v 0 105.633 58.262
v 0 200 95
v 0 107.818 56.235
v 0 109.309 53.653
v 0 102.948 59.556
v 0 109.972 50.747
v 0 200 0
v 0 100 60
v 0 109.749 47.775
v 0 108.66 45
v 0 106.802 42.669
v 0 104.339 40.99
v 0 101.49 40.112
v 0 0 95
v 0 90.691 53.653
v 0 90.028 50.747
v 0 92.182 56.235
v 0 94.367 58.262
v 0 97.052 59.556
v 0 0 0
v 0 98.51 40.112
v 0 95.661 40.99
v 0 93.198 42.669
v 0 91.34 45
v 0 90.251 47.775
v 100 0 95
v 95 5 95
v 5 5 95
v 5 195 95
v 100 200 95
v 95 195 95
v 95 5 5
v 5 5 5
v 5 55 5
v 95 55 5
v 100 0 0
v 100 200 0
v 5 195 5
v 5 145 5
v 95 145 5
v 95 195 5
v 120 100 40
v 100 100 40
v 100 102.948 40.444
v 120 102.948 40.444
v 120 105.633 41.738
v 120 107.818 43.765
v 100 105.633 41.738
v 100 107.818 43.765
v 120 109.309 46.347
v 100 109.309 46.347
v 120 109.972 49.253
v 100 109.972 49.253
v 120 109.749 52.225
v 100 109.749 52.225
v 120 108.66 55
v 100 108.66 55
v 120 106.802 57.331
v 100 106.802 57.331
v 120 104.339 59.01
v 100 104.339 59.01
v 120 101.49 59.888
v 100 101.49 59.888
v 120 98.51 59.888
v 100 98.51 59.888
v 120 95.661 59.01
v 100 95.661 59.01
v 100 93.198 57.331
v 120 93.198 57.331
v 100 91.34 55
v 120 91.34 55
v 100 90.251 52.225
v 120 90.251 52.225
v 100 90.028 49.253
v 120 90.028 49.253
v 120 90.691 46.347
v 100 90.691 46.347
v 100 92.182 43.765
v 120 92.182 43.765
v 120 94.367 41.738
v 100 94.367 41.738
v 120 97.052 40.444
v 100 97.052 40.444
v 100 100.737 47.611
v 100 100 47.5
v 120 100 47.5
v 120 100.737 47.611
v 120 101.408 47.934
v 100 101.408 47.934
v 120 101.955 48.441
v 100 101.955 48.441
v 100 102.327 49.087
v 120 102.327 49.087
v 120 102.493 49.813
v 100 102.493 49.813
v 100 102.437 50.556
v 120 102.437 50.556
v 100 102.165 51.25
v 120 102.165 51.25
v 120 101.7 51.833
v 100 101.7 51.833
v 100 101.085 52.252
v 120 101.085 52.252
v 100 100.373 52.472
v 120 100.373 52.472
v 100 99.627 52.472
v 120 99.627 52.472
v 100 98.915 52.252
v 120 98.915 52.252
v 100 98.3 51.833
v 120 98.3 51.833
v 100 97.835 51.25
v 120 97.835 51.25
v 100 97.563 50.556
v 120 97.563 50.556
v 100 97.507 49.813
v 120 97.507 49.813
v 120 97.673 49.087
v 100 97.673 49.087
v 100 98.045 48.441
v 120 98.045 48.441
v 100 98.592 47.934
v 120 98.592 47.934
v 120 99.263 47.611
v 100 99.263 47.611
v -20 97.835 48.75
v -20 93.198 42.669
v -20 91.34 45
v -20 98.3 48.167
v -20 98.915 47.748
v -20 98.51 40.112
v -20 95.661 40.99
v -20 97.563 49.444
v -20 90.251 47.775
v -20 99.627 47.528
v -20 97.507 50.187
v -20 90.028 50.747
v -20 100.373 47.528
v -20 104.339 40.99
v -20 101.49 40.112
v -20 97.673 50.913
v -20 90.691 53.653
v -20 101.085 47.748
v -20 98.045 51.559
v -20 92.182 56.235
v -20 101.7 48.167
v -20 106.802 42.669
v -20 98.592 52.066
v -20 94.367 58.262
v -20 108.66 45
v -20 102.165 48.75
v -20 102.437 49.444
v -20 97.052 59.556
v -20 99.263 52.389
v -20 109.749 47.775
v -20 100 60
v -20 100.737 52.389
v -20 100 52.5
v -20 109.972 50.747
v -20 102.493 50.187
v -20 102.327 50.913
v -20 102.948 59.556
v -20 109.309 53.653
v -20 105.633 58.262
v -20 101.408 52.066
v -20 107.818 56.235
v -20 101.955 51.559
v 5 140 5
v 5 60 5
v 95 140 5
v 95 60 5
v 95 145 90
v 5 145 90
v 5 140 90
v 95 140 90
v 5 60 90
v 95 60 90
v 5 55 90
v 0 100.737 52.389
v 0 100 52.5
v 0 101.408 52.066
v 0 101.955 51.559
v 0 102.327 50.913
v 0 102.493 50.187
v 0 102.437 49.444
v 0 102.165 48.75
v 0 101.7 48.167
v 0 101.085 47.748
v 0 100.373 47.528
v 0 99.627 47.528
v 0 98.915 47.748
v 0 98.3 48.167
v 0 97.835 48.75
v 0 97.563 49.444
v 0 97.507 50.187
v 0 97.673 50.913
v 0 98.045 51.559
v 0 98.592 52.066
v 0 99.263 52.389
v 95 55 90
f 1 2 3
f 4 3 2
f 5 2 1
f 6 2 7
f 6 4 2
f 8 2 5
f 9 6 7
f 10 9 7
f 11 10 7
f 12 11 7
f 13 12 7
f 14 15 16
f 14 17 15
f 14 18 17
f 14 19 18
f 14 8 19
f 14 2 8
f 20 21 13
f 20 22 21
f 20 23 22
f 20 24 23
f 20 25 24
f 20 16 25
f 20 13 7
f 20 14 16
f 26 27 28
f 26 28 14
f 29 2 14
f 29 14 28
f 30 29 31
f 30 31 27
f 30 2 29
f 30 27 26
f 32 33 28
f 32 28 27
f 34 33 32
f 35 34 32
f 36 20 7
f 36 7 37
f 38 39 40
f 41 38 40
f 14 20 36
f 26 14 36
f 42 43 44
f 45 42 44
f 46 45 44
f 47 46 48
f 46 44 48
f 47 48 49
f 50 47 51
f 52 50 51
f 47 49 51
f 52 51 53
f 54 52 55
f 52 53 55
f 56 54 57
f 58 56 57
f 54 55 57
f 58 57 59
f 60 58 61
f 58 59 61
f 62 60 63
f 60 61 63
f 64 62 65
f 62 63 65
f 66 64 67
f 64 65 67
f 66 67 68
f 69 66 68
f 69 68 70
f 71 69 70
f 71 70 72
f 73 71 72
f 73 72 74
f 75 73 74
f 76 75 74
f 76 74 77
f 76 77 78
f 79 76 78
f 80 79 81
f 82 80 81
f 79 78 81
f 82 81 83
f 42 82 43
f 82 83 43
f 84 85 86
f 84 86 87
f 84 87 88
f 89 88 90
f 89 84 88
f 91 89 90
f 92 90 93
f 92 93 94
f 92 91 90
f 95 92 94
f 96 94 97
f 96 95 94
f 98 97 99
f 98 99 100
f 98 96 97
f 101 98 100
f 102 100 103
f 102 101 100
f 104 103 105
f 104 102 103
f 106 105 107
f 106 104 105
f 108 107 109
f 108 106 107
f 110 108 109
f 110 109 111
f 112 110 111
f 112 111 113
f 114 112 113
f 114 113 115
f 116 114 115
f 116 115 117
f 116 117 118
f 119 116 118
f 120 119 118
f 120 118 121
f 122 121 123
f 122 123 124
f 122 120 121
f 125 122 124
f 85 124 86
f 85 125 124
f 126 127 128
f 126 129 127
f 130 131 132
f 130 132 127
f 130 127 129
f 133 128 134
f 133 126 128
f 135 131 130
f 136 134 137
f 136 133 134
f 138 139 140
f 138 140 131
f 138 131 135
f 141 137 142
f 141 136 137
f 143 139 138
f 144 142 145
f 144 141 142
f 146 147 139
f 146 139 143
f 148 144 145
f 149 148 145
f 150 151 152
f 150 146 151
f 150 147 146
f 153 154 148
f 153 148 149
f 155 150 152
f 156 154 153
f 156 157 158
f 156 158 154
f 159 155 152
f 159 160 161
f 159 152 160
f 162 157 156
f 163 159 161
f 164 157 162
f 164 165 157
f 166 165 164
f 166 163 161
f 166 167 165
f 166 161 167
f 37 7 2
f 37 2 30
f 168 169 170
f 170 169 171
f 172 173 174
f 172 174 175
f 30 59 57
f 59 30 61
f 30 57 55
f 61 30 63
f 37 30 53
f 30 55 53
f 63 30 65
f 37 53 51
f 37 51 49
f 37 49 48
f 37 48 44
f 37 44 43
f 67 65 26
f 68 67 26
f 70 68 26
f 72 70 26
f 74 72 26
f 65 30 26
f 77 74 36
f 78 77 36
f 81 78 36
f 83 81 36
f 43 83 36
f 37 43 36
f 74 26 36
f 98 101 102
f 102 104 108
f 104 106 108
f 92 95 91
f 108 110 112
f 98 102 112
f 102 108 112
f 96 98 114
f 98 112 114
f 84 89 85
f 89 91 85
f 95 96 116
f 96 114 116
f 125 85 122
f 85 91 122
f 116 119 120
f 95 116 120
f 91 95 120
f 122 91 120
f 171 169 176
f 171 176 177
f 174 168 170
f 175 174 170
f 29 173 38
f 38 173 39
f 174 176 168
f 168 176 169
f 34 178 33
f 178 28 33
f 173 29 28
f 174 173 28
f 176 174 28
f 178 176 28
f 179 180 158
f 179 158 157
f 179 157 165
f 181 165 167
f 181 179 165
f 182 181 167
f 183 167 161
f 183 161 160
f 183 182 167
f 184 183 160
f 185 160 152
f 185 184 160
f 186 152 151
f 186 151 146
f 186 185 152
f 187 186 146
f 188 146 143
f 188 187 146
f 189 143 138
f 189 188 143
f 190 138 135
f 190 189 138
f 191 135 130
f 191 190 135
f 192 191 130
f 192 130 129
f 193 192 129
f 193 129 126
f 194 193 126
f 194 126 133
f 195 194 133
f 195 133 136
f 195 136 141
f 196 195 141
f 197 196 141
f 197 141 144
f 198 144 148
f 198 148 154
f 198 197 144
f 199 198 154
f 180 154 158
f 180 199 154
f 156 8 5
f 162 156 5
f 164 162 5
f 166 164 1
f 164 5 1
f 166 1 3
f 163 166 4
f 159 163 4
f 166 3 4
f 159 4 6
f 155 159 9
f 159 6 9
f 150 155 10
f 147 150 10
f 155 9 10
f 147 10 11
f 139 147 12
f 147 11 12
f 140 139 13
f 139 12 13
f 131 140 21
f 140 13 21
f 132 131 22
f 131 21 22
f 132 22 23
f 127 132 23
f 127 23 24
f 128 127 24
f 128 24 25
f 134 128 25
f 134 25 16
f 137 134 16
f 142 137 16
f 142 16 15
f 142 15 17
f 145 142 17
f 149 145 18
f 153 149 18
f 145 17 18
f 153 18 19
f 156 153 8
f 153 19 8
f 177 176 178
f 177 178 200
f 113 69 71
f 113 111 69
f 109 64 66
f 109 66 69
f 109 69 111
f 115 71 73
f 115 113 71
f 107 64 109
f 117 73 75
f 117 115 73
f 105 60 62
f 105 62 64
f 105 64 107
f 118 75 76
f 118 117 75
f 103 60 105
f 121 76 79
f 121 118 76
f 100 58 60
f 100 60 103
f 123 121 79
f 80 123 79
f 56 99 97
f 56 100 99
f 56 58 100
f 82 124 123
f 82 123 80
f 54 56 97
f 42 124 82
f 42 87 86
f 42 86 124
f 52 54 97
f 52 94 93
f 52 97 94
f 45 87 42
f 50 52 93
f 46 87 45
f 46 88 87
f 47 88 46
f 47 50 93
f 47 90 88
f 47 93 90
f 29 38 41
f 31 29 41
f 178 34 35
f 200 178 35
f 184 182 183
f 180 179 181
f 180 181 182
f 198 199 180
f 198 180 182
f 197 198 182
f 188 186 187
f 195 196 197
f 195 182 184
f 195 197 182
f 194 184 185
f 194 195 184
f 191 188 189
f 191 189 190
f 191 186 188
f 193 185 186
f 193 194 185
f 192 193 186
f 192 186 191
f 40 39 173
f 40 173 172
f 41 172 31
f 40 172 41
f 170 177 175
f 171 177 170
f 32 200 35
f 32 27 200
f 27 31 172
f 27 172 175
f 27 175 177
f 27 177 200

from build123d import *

# Parameters (mm, degrees)
SKETCH2_W           = 100
SKETCH2_H           = 100
BOSS_EXTRUDE1_DEPTH = 200
SHELL3_T            = -5
SKETCH3_W           = 90
SKETCH3_H           = 5
BOSS_EXTRUDE2_DEPTH = 85
SKETCH4_R           = 10
SKETCH4_R_2         = 2.5
BOSS_EXTRUDE3_DEPTH = 20
SKETCH5_R           = 10
SKETCH5_R_2         = 2.5
BOSS_EXTRUDE4_DEPTH = 20
SKETCH7_W           = 90
SKETCH7_H           = 5
CUT_EXTRUDE1_DEPTH  = 5


with BuildPart() as part:
    # Sketch2 → Boss-Extrude1 (new body)
    with BuildSketch(Plane(origin=(0, 0, 0), x_dir=(1, 0, 0), z_dir=(0, 1, 0))):
        with Locations((50, -50)):
            Rectangle(SKETCH2_W, SKETCH2_H)
    extrude(amount=BOSS_EXTRUDE1_DEPTH)

    # Shell3
    shell3_openings = [part.faces().sort_by_distance(p)[0] for p in [
        (50, 100, 100),
    ]]
    offset(amount=SHELL3_T, openings=shell3_openings, kind=Kind.INTERSECTION)

    # Sketch3 → Boss-Extrude2 (add)
    with BuildSketch(Plane.XY.offset(5)):
        with Locations((50, 57.5)):
            Rectangle(SKETCH3_W, SKETCH3_H)
        with Locations((50, 142.5)):
            Rectangle(SKETCH3_W, SKETCH3_H)
    extrude(amount=BOSS_EXTRUDE2_DEPTH)

    # Sketch4 → Boss-Extrude3 (add)
    with BuildSketch(Plane(origin=(100, 0, 0), x_dir=(0, 0, -1), z_dir=(1, 0, 0))):
        with Locations((-50, 100)):
            Circle(SKETCH4_R)
        with Locations((-50, 100)):
            Circle(SKETCH4_R_2, mode=Mode.SUBTRACT)
    extrude(amount=BOSS_EXTRUDE3_DEPTH)

    # Sketch5 → Boss-Extrude4 (add)
    with BuildSketch(Plane.ZY):
        with Locations((50, 100)):
            Circle(SKETCH5_R)
        with Locations((50, 100)):
            Circle(SKETCH5_R_2, mode=Mode.SUBTRACT)
    extrude(amount=BOSS_EXTRUDE4_DEPTH)

    # Sketch7 → Cut-Extrude1 (cut)
    with BuildSketch(Plane.XY.offset(100)):
        Polygon((95, 200), (0, 200), (0, 195), (5, 195), (95, 195), align=None)
        Polygon((100, 200), (95, 200), (95, 195), (95, 5), (95, 0), (100, 0), align=None)
        Polygon((5, 195), (0, 195), (0, 0), (5, 0), (5, 5), align=None)
        with Locations((50, 2.5)):
            Rectangle(SKETCH7_W, SKETCH7_H)
    extrude(amount=-CUT_EXTRUDE1_DEPTH, mode=Mode.SUBTRACT)


solid = part.part
